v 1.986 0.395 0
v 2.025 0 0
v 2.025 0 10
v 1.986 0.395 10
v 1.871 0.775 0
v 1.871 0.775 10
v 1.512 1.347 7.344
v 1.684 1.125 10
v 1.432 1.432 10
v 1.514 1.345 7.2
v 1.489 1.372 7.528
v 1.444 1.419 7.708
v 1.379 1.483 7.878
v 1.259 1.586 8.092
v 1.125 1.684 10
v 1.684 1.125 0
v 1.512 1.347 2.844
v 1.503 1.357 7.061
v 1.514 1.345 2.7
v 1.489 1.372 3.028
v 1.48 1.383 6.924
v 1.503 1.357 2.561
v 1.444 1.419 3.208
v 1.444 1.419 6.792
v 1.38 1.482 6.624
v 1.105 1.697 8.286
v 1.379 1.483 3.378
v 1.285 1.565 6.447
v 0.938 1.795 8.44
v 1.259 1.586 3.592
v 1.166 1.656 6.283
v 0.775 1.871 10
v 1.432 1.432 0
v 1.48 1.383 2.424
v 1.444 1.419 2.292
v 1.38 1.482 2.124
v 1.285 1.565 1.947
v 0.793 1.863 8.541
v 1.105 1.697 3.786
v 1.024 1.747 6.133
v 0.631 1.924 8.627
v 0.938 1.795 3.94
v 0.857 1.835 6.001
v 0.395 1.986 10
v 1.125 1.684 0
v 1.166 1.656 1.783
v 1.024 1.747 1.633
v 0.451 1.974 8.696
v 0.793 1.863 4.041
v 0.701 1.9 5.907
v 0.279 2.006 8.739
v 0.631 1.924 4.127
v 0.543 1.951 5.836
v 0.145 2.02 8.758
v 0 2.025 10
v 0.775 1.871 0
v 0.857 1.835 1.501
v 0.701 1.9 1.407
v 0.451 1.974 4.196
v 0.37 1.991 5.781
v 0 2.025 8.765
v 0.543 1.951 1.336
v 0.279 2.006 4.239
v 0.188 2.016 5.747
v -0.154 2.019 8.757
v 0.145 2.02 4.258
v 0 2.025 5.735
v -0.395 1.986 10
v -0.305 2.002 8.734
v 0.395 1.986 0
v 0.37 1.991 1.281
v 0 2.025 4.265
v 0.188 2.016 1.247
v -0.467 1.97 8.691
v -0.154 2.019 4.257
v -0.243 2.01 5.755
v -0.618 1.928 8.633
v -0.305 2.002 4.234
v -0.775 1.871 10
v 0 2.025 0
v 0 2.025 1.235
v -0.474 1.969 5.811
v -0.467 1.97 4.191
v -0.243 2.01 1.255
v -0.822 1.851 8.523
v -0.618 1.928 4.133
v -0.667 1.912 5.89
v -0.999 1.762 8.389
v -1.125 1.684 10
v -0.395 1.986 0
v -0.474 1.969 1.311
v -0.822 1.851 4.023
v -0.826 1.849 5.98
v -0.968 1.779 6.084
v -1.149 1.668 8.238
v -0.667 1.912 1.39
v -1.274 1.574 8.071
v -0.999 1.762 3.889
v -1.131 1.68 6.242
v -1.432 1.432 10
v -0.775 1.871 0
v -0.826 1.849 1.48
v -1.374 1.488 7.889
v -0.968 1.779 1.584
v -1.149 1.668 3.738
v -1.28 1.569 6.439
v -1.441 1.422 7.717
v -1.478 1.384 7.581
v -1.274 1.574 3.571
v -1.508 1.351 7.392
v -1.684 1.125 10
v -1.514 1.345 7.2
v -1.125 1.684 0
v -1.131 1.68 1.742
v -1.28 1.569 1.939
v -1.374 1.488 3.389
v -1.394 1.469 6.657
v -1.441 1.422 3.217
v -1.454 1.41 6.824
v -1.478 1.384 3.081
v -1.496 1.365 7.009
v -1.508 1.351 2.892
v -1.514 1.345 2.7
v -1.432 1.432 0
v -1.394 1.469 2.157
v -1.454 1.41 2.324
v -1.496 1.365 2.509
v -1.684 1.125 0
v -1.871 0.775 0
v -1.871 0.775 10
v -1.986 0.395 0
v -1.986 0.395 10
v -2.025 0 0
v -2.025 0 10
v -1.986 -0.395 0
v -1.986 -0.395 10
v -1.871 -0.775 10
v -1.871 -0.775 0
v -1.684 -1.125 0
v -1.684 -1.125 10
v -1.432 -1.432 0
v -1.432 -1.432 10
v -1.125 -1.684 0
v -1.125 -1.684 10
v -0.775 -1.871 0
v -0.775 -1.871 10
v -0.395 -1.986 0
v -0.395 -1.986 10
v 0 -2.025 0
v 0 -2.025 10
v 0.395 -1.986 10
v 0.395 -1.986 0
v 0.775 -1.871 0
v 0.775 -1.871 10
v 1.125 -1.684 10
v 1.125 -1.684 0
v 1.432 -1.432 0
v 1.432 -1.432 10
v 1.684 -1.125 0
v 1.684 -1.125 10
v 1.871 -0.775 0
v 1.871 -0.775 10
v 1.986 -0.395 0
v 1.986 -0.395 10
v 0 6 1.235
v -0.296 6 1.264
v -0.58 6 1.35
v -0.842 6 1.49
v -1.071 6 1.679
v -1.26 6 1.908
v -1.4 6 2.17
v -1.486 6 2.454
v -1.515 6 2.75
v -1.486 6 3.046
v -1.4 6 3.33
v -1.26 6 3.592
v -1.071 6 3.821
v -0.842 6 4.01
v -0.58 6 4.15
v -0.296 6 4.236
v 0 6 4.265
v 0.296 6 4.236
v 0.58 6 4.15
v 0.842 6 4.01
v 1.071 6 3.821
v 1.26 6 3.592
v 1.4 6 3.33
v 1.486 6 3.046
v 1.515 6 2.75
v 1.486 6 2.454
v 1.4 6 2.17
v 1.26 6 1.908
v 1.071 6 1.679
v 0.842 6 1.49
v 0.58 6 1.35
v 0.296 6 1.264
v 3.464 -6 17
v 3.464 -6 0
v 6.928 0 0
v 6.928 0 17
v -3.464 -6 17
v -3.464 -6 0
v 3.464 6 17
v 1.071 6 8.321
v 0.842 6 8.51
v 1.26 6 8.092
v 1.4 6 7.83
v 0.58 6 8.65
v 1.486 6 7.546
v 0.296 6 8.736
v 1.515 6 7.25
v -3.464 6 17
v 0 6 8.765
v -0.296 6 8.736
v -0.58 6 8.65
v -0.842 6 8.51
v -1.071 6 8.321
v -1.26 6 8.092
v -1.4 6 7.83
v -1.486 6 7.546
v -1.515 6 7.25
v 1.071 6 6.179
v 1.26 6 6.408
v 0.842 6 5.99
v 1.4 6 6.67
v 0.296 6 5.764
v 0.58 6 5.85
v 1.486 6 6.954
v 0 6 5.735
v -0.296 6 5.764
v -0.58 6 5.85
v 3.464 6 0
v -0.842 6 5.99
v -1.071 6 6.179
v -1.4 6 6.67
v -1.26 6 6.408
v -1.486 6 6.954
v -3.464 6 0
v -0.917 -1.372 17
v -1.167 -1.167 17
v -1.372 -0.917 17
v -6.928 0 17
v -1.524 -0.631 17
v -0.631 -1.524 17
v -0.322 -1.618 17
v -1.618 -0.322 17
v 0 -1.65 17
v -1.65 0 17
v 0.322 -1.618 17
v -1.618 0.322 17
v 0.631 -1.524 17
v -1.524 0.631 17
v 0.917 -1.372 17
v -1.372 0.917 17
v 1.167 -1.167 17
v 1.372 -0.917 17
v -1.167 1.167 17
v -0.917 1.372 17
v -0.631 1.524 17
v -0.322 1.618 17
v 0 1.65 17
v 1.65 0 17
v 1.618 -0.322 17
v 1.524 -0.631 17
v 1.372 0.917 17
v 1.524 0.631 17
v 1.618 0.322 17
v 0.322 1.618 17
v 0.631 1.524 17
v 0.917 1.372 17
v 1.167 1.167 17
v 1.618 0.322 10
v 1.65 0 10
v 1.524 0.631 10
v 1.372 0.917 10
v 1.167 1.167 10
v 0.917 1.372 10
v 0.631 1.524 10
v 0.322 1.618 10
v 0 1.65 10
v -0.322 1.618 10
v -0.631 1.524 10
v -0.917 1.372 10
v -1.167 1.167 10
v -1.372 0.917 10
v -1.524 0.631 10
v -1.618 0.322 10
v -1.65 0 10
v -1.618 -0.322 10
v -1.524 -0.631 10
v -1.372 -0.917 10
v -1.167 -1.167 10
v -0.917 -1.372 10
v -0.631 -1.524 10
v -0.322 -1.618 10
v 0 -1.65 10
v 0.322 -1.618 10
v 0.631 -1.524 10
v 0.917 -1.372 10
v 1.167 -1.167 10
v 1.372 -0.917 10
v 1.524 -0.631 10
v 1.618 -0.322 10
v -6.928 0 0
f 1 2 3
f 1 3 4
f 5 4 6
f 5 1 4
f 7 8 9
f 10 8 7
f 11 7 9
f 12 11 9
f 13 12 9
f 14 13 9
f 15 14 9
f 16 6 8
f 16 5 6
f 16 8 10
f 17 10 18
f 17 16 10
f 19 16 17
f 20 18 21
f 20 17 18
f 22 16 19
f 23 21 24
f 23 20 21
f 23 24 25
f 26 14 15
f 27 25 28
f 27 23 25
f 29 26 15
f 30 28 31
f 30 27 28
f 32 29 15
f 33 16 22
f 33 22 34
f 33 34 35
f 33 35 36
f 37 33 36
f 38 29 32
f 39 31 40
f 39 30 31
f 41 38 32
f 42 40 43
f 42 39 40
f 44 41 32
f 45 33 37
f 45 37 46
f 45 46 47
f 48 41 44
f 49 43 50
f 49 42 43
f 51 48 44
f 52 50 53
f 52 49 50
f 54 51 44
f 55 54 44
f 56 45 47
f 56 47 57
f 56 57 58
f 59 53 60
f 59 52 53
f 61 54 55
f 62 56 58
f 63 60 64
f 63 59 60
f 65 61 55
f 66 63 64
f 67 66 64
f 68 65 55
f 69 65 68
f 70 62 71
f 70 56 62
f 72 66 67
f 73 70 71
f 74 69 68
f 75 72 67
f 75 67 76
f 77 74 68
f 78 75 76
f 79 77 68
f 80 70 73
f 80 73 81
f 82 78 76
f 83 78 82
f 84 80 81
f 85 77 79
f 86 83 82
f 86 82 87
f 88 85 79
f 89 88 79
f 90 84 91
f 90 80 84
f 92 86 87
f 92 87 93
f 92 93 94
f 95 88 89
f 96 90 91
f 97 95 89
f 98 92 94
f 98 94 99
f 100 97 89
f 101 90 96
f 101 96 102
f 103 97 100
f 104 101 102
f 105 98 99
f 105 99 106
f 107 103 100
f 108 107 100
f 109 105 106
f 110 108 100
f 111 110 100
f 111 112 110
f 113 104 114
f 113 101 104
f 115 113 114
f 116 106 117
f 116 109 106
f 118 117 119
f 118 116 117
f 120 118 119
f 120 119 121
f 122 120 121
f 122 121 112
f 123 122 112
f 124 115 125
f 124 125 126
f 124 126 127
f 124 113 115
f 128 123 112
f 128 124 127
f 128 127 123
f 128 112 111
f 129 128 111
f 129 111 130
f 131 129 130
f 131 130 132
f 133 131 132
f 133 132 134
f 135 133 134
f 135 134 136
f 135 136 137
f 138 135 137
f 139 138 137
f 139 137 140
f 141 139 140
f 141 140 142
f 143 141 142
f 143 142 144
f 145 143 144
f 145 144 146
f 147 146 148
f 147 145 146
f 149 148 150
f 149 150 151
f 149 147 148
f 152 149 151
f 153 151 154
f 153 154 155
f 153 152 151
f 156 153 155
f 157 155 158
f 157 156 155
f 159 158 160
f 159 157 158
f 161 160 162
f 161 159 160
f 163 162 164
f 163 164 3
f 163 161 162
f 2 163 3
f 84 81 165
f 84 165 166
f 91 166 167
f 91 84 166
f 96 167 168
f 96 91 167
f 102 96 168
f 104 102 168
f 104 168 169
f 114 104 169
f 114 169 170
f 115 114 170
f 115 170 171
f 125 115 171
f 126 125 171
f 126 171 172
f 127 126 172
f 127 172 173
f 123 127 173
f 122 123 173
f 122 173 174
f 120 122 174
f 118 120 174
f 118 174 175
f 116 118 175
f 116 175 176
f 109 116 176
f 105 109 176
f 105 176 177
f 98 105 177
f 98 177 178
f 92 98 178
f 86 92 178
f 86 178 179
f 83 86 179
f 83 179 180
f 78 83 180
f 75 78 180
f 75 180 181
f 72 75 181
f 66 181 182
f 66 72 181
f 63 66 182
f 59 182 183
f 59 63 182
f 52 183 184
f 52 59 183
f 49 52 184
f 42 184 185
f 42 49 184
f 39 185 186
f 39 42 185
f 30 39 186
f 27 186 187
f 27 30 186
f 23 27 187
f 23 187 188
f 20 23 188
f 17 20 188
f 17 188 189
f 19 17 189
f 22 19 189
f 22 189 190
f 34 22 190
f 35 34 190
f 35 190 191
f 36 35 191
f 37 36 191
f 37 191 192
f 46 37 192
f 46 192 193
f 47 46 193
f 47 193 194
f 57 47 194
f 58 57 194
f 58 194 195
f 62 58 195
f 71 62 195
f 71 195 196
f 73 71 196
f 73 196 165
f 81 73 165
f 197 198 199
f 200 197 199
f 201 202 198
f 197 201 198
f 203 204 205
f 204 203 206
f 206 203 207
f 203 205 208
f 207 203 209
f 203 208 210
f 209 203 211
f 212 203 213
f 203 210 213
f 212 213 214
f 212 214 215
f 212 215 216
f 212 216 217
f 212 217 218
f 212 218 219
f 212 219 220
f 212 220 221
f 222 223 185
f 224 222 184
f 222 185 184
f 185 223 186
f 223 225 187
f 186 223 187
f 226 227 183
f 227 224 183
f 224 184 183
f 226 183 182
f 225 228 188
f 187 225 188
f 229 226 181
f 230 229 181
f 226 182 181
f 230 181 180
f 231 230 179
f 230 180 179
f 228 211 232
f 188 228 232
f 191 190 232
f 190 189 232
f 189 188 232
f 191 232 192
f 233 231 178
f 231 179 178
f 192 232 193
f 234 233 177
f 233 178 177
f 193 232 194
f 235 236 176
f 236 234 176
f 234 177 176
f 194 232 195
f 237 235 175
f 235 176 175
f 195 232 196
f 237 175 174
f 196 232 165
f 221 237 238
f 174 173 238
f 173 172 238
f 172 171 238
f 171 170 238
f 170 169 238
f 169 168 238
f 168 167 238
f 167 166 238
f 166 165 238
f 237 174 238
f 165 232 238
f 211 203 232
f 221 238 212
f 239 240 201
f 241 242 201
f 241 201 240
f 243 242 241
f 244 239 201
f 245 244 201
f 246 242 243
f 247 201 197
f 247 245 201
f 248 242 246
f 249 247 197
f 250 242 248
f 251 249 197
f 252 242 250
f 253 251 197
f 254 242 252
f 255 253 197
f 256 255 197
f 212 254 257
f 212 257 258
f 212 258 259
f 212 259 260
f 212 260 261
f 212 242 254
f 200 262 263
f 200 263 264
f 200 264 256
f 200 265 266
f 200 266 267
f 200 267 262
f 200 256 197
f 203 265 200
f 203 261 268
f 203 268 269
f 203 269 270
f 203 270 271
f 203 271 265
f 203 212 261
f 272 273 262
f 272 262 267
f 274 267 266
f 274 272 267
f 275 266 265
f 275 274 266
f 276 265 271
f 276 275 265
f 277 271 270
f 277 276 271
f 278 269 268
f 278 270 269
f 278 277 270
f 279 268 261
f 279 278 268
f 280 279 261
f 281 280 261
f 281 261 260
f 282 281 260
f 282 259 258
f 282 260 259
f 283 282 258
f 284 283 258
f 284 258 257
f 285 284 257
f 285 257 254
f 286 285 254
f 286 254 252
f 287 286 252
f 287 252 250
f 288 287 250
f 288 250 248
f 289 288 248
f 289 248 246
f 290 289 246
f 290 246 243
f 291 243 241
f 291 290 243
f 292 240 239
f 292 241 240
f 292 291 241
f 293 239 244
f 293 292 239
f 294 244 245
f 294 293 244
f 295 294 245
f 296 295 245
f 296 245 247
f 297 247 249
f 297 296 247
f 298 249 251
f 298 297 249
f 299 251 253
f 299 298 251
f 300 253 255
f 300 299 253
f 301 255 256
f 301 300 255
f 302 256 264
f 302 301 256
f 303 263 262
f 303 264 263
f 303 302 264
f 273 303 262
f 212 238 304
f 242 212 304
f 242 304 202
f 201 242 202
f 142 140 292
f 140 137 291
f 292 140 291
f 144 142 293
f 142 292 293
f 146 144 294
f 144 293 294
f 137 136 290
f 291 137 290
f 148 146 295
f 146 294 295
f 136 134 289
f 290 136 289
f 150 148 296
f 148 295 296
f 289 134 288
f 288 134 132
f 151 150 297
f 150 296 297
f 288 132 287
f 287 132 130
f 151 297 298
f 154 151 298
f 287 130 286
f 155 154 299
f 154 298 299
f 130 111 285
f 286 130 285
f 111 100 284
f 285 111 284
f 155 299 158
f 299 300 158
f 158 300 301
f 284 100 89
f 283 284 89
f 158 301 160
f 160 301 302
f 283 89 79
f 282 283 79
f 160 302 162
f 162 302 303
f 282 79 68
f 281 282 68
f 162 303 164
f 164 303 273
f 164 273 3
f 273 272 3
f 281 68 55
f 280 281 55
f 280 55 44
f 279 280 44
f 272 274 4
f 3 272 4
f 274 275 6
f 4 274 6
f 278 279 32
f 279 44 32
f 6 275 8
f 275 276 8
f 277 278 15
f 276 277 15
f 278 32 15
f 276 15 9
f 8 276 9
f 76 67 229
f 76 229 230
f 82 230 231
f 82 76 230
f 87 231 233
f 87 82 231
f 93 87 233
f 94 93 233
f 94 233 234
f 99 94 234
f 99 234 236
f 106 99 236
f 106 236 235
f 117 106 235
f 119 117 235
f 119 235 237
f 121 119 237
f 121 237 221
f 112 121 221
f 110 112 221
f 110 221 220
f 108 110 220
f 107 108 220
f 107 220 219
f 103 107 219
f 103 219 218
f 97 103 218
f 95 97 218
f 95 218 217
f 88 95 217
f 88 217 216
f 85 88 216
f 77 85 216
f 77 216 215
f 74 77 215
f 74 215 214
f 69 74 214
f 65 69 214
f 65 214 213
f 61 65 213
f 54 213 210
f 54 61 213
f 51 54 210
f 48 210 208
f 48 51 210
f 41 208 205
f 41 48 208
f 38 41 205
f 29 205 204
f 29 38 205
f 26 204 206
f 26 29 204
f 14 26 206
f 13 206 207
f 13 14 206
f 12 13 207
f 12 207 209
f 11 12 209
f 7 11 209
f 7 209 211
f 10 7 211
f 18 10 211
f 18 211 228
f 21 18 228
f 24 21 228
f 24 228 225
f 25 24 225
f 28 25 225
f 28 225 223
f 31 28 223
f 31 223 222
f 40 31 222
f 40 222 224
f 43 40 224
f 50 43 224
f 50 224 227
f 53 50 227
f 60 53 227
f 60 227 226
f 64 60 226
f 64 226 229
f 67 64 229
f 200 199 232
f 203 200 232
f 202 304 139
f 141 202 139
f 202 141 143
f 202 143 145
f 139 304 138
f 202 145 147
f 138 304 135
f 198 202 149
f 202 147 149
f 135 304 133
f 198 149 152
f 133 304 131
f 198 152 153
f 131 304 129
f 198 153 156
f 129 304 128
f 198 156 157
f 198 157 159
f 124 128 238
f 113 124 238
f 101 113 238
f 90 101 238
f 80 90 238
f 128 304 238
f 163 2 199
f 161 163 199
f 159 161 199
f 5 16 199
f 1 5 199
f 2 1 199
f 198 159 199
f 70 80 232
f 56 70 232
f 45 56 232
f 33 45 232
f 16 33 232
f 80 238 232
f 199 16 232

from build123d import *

# Parameters (mm, degrees)
F_01_17_MM_COMMERCIAL_DRIVE_HEX_DEPTH  = 17
F_02_START                             = -0.1
S02_SHAFT_SEAT_R                       = 2.025
F_02_SHAFT_SEAT_DEPTH                  = 10.1
F_03_START                             = 9.99
S03_OUTBOARD_M4_THREAD_ENVELOPE_R      = 1.65
F_03_OUTBOARD_M4_THREAD_ENVELOPE_DEPTH = 7.11
S04_RADIAL_M3_SET_SCREW_1_R            = 1.515
F_04_RADIAL_M3_SET_SCREW_1_DEPTH       = 7
S05_RADIAL_M3_SET_SCREW_2_R            = 1.515
F_05_RADIAL_M3_SET_SCREW_2_DEPTH       = 7


with BuildPart() as part:
    # S01 - 17 mm commercial drive hex → 01 - 17 mm commercial drive hex (new body)
    with BuildSketch(Plane.XY):
        Polygon((6.92820323, 0), (3.464101615, 6), (-3.464101615, 6), (-6.92820323, 0), (-3.464101615, -6), (3.464101615, -6), align=None)
    extrude(amount=F_01_17_MM_COMMERCIAL_DRIVE_HEX_DEPTH)

    # S02 - Shaft seat → 02 - Shaft seat (cut)
    with BuildSketch(Plane.XY.offset(F_02_START)):
        Circle(S02_SHAFT_SEAT_R)
    extrude(amount=F_02_SHAFT_SEAT_DEPTH, mode=Mode.SUBTRACT)

    # S03 - Outboard M4 thread envelope → 03 - Outboard M4 thread envelope (cut)
    with BuildSketch(Plane.XY.offset(F_03_START)):
        Circle(S03_OUTBOARD_M4_THREAD_ENVELOPE_R)
    extrude(amount=F_03_OUTBOARD_M4_THREAD_ENVELOPE_DEPTH, mode=Mode.SUBTRACT)

    # S04 - Radial M3 set screw 1 → 04 - Radial M3 set screw 1 (cut)
    with BuildSketch(Plane(origin=(0, 0, 0), x_dir=(1, 0, 0), z_dir=(0, 1, 0))):
        with Locations(Location((0, -2.75, 0), (0, 0, 90))):
            Circle(S04_RADIAL_M3_SET_SCREW_1_R)
    extrude(amount=F_04_RADIAL_M3_SET_SCREW_1_DEPTH, mode=Mode.SUBTRACT)

    # S05 - Radial M3 set screw 2 → 05 - Radial M3 set screw 2 (cut)
    with BuildSketch(Plane(origin=(0, 0, 0), x_dir=(1, 0, 0), z_dir=(0, 1, 0))):
        with Locations(Location((0, -7.25, 0), (0, 0, 90))):
            Circle(S05_RADIAL_M3_SET_SCREW_2_R)
    extrude(amount=F_05_RADIAL_M3_SET_SCREW_2_DEPTH, mode=Mode.SUBTRACT)


solid = part.part
